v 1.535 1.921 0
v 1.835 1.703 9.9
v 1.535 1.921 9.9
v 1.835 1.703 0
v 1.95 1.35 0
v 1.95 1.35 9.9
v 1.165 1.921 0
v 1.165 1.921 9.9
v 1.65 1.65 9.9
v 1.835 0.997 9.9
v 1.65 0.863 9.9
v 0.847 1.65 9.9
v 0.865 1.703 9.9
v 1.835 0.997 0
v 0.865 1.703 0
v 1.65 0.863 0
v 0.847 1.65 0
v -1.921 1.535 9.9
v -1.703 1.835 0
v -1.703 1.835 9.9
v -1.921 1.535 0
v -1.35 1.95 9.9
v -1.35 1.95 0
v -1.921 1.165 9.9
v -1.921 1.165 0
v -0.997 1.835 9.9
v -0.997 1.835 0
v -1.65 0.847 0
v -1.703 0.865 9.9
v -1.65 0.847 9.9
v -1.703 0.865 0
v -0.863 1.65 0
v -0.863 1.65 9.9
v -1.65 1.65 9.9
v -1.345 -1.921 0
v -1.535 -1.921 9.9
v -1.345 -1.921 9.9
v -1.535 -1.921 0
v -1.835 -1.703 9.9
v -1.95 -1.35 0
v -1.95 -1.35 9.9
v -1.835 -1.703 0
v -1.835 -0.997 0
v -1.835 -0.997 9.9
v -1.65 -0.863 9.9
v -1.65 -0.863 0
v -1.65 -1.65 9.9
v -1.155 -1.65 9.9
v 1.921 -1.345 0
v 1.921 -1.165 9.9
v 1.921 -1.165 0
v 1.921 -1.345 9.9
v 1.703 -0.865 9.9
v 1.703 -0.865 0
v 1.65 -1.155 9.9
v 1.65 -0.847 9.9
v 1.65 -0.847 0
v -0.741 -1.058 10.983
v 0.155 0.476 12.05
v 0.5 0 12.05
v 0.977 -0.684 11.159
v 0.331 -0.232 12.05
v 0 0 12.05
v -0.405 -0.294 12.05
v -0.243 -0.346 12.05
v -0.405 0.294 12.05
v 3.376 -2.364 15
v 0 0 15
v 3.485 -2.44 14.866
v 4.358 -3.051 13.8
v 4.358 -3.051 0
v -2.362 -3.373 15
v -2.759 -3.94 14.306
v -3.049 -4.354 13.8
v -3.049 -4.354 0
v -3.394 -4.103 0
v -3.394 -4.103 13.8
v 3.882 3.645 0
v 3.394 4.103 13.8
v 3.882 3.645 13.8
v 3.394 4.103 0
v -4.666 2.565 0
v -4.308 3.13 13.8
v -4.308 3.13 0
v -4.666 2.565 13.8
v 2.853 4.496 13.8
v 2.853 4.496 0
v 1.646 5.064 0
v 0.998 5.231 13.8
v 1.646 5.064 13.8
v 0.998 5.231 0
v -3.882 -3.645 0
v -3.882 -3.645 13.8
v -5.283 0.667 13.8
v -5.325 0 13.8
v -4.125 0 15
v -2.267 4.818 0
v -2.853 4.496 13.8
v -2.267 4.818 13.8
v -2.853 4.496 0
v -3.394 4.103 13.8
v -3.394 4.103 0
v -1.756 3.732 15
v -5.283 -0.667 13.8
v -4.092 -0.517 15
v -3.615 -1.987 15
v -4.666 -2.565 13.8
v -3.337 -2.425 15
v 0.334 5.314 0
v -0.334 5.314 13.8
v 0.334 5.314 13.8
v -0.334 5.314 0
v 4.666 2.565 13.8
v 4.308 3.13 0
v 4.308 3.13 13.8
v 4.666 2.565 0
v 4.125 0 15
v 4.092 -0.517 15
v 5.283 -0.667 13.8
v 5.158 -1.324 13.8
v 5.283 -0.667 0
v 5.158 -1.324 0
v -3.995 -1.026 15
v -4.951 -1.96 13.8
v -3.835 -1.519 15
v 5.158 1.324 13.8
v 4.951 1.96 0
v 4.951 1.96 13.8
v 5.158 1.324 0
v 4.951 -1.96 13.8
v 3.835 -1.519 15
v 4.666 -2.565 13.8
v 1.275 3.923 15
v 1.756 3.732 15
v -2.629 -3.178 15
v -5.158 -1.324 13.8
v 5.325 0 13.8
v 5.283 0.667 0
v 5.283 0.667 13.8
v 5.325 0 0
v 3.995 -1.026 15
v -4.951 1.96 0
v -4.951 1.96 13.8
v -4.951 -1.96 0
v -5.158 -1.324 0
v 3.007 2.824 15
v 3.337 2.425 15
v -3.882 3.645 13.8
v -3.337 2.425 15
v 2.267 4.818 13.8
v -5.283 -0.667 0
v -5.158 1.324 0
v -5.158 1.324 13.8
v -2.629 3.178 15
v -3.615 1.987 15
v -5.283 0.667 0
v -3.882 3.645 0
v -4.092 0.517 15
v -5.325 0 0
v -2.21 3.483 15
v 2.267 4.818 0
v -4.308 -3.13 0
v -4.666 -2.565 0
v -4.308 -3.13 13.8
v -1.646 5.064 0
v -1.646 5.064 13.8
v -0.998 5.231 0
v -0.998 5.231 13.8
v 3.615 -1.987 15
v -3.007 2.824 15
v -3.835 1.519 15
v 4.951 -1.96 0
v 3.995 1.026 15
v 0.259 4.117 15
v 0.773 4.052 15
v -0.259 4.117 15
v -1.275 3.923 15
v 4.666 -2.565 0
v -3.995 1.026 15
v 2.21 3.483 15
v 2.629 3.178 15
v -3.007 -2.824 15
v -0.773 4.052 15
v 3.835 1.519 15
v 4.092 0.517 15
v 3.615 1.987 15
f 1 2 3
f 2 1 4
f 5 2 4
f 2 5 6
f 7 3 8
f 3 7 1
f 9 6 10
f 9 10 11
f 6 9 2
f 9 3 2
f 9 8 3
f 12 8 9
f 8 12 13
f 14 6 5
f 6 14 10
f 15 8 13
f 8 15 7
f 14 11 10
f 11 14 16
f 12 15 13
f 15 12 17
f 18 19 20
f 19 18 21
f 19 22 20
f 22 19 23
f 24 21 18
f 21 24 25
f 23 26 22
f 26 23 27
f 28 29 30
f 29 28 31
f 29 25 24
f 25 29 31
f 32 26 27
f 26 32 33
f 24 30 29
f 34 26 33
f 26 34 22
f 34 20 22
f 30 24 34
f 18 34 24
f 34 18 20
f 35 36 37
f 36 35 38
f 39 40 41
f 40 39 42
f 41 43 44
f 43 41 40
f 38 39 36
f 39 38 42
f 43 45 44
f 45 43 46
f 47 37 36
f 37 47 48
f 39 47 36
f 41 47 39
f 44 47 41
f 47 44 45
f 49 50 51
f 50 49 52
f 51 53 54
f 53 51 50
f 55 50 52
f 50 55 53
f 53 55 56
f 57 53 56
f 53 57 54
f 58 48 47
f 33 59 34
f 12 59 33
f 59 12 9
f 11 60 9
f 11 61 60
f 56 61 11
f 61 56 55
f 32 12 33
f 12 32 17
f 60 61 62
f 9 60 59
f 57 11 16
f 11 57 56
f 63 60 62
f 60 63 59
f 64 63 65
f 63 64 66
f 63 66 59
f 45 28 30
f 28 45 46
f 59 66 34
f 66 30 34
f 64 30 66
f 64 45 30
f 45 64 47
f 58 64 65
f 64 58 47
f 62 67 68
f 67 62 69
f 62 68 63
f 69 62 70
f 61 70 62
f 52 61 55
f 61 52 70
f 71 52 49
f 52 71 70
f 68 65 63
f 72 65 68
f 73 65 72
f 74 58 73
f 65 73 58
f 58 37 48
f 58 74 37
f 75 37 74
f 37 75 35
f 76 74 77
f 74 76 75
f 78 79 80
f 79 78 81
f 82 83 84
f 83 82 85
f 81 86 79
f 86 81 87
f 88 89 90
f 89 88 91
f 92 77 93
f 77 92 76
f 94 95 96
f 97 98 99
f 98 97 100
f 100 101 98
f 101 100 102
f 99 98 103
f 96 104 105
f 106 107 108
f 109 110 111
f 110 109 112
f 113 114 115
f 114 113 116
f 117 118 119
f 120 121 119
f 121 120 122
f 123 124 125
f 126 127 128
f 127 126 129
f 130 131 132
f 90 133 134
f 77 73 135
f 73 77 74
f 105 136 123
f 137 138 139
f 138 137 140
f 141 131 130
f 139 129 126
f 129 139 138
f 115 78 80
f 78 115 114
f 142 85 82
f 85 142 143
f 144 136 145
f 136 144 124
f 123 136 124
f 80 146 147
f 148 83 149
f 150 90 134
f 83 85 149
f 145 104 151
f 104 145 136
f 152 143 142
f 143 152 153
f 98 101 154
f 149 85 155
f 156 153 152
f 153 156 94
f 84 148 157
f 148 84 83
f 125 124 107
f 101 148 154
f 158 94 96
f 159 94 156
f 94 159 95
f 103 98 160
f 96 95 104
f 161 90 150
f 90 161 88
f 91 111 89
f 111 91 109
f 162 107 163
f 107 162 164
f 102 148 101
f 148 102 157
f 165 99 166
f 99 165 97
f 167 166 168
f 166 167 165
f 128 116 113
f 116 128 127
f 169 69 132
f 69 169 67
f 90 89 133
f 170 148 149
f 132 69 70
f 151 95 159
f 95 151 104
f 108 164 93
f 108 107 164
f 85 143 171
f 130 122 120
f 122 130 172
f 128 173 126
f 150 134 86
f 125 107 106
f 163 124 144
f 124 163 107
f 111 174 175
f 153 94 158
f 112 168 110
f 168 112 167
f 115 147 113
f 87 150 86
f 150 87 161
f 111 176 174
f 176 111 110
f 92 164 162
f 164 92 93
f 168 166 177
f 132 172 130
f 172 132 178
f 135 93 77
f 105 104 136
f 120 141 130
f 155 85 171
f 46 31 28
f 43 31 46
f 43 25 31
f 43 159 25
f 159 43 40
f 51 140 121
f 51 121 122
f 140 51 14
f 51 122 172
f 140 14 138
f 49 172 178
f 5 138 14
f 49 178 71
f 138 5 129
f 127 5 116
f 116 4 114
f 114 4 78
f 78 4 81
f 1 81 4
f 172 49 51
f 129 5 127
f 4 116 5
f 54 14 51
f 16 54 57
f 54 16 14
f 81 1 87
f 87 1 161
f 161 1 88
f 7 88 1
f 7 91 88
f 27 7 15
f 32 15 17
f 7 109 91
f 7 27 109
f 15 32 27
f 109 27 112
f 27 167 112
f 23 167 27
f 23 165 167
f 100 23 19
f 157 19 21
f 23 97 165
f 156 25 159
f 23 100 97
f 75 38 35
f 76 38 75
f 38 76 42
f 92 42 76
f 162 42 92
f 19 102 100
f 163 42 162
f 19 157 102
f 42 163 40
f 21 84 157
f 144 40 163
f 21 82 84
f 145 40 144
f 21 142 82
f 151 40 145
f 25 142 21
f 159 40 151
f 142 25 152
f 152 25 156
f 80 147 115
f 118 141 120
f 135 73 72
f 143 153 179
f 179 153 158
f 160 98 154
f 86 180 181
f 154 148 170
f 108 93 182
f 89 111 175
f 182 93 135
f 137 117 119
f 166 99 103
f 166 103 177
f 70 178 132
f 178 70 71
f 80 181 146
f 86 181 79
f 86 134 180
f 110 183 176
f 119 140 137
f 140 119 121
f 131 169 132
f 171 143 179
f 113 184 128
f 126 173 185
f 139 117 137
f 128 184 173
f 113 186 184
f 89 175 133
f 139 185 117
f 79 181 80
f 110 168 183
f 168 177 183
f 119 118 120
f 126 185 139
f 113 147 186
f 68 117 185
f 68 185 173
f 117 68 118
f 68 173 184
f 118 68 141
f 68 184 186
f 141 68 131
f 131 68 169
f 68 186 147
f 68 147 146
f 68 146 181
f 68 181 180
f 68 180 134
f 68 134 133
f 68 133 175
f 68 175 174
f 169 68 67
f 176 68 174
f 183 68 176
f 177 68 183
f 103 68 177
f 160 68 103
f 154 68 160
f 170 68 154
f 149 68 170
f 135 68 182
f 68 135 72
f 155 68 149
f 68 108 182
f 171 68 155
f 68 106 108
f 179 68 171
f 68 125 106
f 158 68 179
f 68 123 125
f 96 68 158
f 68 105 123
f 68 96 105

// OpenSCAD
// Push button generator
// Makes round or square buttons with round or square shaft holes, and bevelled edges
// square holes are keyholed to prevent rounding of internal corners
// holes are vaulted so no support will be needed inside them
// customizer compatible

//defualt is to
// Make replacement buttons for Atlas stove
// button is a round button press fit onto a square 3.3mm shaft
// this is a standard size for "isostat" switches

/* [Global] */
//Visualising
Show="CrossSection"; //[Complete,CrossSection]
//Outside shape of button
ButtonShape="Round"; //[Round,Square,Oval]

/* [Button] */
//Length of Button
L=15;

//Outside Diameter of Round Button
ButtonOD=10.65;

//Rectangular or oval ButtonX
ButtonX=15;
//Rectangular or oval ButtonY
ButtonY=10;

//amount of bevel around top edge of button
TopBevel=1.2;
//Style of the button edge (for square buttons)
EdgeStyle="Round"; //[Radius,Bevel,Square]
//Bevel of bevelled edges. (This is X,Y distance, not the bevel face length)
EdgeBevel=1.2;
//Radius of rounded edges
EdgeR=1.2;
   
/* [Shaft Hole] */
ShaftShape="Square"; //[Square,Round]
//Length of shaft inside button. Crown of hole is vaulted for support free build
ShaftL=10;
//Side width of square shafts or diameter of round shafts
ShaftW=3.3;
//Oversize in mm for internal holes (diameter). UP printer makes internal holes small. Adjuest this for correct internal size
holeos=0;
//So that square shaft holes don't have rounded corners they must have a keyhole at the corner
ShaftKeyholeD=1.2;

KeyholeR=ShaftKeyholeD/2;

OR=ButtonOD/2;
ShaftI=ShaftW+holeos; //side length or IR
ShaftR=(ShaftW+holeos)/2; //for round shafts

//------


module SqShaft() {
    hull() { 
    translate([-ShaftI/2,-ShaftI/2,0]) 
        cube([ShaftI, ShaftI,ShaftL]);
     translate([0,0,ShaftL+ShaftI/2])
        cylinder(r=0.5,h=0.5);
    }//hull
    KHO=ShaftI/2-KeyholeR/2;
    for (A=[0:3]) {
        rotate([0,0,A*90])            
            translate([KHO,KHO,0]) 
                cylinder(r=KeyholeR, h=ShaftL,$fn=10);
    }//for

}//mod
module RoundShaft() {
    cylinder(r=ShaftR, h=ShaftL, $fn=20);
    translate([0,0,ShaftL])
        cylinder(r1=ShaftR,r2=0.1,h=ShaftR); //vault at top of hole
}//mod

module RoundButton() {
        H1=L-TopBevel;
        hull() {
            cylinder(r=OR, h=H1, $fn=50);
            translate([0,0,H1]) 
            cylinder(r=OR-TopBevel, h=TopBevel,$fn=50);  
        };//hull  
}//mod

module SquareButton() {
        H1=L-TopBevel;
        hull() {
            //translate([0,0,H1/2]) cube([ButtonX,ButtonY,H1], center=true);
            for (iX=[1,-1],iY=[1,-1]) {         
                    translate([(ButtonX/2-EdgeBevel)*iX,(ButtonY/2-EdgeBevel)*iY,H1/2]) 
                        if (EdgeStyle=="Bevel") {
                                rotate([0,0,45]) //bevels are made by using edge of these cubes at 45deg
                                    cube([EdgeBevel*sqrt(2),EdgeBevel*sqrt(2),H1],center=true);
                        } else {
                            if (EdgeStyle!="Square") {
                                cylinder(r=EdgeR, h=H1, center=true,$fn=20);
                            } else {
                                cylinder(r=0.1, h=H1, center=true,$fn=20);
                            }//if                                
                        }//if
                    }//for
            translate([0,0,H1+TopBevel/2]) 
                 cube([ButtonX-(2*TopBevel),ButtonY-(2*TopBevel),TopBevel], center=true); //bevelled top
        }//hull  
}//mod

difference() {
    if (ButtonShape=="Square") {
        SquareButton();
    } else { //round, oval
        RoundButton();
    };
    translate([0,0,-0.1])  {
        if (ShaftShape=="Round") {
            RoundShaft();
        }else{
            SqShaft();
        }//if
        if (Show=="CrossSection") {
            //MM=max(ButtonX,ButtonY);
            rotate([0,0,-125]) cube([100,100,L+1]);
    }//if
}//translate
}//difference
